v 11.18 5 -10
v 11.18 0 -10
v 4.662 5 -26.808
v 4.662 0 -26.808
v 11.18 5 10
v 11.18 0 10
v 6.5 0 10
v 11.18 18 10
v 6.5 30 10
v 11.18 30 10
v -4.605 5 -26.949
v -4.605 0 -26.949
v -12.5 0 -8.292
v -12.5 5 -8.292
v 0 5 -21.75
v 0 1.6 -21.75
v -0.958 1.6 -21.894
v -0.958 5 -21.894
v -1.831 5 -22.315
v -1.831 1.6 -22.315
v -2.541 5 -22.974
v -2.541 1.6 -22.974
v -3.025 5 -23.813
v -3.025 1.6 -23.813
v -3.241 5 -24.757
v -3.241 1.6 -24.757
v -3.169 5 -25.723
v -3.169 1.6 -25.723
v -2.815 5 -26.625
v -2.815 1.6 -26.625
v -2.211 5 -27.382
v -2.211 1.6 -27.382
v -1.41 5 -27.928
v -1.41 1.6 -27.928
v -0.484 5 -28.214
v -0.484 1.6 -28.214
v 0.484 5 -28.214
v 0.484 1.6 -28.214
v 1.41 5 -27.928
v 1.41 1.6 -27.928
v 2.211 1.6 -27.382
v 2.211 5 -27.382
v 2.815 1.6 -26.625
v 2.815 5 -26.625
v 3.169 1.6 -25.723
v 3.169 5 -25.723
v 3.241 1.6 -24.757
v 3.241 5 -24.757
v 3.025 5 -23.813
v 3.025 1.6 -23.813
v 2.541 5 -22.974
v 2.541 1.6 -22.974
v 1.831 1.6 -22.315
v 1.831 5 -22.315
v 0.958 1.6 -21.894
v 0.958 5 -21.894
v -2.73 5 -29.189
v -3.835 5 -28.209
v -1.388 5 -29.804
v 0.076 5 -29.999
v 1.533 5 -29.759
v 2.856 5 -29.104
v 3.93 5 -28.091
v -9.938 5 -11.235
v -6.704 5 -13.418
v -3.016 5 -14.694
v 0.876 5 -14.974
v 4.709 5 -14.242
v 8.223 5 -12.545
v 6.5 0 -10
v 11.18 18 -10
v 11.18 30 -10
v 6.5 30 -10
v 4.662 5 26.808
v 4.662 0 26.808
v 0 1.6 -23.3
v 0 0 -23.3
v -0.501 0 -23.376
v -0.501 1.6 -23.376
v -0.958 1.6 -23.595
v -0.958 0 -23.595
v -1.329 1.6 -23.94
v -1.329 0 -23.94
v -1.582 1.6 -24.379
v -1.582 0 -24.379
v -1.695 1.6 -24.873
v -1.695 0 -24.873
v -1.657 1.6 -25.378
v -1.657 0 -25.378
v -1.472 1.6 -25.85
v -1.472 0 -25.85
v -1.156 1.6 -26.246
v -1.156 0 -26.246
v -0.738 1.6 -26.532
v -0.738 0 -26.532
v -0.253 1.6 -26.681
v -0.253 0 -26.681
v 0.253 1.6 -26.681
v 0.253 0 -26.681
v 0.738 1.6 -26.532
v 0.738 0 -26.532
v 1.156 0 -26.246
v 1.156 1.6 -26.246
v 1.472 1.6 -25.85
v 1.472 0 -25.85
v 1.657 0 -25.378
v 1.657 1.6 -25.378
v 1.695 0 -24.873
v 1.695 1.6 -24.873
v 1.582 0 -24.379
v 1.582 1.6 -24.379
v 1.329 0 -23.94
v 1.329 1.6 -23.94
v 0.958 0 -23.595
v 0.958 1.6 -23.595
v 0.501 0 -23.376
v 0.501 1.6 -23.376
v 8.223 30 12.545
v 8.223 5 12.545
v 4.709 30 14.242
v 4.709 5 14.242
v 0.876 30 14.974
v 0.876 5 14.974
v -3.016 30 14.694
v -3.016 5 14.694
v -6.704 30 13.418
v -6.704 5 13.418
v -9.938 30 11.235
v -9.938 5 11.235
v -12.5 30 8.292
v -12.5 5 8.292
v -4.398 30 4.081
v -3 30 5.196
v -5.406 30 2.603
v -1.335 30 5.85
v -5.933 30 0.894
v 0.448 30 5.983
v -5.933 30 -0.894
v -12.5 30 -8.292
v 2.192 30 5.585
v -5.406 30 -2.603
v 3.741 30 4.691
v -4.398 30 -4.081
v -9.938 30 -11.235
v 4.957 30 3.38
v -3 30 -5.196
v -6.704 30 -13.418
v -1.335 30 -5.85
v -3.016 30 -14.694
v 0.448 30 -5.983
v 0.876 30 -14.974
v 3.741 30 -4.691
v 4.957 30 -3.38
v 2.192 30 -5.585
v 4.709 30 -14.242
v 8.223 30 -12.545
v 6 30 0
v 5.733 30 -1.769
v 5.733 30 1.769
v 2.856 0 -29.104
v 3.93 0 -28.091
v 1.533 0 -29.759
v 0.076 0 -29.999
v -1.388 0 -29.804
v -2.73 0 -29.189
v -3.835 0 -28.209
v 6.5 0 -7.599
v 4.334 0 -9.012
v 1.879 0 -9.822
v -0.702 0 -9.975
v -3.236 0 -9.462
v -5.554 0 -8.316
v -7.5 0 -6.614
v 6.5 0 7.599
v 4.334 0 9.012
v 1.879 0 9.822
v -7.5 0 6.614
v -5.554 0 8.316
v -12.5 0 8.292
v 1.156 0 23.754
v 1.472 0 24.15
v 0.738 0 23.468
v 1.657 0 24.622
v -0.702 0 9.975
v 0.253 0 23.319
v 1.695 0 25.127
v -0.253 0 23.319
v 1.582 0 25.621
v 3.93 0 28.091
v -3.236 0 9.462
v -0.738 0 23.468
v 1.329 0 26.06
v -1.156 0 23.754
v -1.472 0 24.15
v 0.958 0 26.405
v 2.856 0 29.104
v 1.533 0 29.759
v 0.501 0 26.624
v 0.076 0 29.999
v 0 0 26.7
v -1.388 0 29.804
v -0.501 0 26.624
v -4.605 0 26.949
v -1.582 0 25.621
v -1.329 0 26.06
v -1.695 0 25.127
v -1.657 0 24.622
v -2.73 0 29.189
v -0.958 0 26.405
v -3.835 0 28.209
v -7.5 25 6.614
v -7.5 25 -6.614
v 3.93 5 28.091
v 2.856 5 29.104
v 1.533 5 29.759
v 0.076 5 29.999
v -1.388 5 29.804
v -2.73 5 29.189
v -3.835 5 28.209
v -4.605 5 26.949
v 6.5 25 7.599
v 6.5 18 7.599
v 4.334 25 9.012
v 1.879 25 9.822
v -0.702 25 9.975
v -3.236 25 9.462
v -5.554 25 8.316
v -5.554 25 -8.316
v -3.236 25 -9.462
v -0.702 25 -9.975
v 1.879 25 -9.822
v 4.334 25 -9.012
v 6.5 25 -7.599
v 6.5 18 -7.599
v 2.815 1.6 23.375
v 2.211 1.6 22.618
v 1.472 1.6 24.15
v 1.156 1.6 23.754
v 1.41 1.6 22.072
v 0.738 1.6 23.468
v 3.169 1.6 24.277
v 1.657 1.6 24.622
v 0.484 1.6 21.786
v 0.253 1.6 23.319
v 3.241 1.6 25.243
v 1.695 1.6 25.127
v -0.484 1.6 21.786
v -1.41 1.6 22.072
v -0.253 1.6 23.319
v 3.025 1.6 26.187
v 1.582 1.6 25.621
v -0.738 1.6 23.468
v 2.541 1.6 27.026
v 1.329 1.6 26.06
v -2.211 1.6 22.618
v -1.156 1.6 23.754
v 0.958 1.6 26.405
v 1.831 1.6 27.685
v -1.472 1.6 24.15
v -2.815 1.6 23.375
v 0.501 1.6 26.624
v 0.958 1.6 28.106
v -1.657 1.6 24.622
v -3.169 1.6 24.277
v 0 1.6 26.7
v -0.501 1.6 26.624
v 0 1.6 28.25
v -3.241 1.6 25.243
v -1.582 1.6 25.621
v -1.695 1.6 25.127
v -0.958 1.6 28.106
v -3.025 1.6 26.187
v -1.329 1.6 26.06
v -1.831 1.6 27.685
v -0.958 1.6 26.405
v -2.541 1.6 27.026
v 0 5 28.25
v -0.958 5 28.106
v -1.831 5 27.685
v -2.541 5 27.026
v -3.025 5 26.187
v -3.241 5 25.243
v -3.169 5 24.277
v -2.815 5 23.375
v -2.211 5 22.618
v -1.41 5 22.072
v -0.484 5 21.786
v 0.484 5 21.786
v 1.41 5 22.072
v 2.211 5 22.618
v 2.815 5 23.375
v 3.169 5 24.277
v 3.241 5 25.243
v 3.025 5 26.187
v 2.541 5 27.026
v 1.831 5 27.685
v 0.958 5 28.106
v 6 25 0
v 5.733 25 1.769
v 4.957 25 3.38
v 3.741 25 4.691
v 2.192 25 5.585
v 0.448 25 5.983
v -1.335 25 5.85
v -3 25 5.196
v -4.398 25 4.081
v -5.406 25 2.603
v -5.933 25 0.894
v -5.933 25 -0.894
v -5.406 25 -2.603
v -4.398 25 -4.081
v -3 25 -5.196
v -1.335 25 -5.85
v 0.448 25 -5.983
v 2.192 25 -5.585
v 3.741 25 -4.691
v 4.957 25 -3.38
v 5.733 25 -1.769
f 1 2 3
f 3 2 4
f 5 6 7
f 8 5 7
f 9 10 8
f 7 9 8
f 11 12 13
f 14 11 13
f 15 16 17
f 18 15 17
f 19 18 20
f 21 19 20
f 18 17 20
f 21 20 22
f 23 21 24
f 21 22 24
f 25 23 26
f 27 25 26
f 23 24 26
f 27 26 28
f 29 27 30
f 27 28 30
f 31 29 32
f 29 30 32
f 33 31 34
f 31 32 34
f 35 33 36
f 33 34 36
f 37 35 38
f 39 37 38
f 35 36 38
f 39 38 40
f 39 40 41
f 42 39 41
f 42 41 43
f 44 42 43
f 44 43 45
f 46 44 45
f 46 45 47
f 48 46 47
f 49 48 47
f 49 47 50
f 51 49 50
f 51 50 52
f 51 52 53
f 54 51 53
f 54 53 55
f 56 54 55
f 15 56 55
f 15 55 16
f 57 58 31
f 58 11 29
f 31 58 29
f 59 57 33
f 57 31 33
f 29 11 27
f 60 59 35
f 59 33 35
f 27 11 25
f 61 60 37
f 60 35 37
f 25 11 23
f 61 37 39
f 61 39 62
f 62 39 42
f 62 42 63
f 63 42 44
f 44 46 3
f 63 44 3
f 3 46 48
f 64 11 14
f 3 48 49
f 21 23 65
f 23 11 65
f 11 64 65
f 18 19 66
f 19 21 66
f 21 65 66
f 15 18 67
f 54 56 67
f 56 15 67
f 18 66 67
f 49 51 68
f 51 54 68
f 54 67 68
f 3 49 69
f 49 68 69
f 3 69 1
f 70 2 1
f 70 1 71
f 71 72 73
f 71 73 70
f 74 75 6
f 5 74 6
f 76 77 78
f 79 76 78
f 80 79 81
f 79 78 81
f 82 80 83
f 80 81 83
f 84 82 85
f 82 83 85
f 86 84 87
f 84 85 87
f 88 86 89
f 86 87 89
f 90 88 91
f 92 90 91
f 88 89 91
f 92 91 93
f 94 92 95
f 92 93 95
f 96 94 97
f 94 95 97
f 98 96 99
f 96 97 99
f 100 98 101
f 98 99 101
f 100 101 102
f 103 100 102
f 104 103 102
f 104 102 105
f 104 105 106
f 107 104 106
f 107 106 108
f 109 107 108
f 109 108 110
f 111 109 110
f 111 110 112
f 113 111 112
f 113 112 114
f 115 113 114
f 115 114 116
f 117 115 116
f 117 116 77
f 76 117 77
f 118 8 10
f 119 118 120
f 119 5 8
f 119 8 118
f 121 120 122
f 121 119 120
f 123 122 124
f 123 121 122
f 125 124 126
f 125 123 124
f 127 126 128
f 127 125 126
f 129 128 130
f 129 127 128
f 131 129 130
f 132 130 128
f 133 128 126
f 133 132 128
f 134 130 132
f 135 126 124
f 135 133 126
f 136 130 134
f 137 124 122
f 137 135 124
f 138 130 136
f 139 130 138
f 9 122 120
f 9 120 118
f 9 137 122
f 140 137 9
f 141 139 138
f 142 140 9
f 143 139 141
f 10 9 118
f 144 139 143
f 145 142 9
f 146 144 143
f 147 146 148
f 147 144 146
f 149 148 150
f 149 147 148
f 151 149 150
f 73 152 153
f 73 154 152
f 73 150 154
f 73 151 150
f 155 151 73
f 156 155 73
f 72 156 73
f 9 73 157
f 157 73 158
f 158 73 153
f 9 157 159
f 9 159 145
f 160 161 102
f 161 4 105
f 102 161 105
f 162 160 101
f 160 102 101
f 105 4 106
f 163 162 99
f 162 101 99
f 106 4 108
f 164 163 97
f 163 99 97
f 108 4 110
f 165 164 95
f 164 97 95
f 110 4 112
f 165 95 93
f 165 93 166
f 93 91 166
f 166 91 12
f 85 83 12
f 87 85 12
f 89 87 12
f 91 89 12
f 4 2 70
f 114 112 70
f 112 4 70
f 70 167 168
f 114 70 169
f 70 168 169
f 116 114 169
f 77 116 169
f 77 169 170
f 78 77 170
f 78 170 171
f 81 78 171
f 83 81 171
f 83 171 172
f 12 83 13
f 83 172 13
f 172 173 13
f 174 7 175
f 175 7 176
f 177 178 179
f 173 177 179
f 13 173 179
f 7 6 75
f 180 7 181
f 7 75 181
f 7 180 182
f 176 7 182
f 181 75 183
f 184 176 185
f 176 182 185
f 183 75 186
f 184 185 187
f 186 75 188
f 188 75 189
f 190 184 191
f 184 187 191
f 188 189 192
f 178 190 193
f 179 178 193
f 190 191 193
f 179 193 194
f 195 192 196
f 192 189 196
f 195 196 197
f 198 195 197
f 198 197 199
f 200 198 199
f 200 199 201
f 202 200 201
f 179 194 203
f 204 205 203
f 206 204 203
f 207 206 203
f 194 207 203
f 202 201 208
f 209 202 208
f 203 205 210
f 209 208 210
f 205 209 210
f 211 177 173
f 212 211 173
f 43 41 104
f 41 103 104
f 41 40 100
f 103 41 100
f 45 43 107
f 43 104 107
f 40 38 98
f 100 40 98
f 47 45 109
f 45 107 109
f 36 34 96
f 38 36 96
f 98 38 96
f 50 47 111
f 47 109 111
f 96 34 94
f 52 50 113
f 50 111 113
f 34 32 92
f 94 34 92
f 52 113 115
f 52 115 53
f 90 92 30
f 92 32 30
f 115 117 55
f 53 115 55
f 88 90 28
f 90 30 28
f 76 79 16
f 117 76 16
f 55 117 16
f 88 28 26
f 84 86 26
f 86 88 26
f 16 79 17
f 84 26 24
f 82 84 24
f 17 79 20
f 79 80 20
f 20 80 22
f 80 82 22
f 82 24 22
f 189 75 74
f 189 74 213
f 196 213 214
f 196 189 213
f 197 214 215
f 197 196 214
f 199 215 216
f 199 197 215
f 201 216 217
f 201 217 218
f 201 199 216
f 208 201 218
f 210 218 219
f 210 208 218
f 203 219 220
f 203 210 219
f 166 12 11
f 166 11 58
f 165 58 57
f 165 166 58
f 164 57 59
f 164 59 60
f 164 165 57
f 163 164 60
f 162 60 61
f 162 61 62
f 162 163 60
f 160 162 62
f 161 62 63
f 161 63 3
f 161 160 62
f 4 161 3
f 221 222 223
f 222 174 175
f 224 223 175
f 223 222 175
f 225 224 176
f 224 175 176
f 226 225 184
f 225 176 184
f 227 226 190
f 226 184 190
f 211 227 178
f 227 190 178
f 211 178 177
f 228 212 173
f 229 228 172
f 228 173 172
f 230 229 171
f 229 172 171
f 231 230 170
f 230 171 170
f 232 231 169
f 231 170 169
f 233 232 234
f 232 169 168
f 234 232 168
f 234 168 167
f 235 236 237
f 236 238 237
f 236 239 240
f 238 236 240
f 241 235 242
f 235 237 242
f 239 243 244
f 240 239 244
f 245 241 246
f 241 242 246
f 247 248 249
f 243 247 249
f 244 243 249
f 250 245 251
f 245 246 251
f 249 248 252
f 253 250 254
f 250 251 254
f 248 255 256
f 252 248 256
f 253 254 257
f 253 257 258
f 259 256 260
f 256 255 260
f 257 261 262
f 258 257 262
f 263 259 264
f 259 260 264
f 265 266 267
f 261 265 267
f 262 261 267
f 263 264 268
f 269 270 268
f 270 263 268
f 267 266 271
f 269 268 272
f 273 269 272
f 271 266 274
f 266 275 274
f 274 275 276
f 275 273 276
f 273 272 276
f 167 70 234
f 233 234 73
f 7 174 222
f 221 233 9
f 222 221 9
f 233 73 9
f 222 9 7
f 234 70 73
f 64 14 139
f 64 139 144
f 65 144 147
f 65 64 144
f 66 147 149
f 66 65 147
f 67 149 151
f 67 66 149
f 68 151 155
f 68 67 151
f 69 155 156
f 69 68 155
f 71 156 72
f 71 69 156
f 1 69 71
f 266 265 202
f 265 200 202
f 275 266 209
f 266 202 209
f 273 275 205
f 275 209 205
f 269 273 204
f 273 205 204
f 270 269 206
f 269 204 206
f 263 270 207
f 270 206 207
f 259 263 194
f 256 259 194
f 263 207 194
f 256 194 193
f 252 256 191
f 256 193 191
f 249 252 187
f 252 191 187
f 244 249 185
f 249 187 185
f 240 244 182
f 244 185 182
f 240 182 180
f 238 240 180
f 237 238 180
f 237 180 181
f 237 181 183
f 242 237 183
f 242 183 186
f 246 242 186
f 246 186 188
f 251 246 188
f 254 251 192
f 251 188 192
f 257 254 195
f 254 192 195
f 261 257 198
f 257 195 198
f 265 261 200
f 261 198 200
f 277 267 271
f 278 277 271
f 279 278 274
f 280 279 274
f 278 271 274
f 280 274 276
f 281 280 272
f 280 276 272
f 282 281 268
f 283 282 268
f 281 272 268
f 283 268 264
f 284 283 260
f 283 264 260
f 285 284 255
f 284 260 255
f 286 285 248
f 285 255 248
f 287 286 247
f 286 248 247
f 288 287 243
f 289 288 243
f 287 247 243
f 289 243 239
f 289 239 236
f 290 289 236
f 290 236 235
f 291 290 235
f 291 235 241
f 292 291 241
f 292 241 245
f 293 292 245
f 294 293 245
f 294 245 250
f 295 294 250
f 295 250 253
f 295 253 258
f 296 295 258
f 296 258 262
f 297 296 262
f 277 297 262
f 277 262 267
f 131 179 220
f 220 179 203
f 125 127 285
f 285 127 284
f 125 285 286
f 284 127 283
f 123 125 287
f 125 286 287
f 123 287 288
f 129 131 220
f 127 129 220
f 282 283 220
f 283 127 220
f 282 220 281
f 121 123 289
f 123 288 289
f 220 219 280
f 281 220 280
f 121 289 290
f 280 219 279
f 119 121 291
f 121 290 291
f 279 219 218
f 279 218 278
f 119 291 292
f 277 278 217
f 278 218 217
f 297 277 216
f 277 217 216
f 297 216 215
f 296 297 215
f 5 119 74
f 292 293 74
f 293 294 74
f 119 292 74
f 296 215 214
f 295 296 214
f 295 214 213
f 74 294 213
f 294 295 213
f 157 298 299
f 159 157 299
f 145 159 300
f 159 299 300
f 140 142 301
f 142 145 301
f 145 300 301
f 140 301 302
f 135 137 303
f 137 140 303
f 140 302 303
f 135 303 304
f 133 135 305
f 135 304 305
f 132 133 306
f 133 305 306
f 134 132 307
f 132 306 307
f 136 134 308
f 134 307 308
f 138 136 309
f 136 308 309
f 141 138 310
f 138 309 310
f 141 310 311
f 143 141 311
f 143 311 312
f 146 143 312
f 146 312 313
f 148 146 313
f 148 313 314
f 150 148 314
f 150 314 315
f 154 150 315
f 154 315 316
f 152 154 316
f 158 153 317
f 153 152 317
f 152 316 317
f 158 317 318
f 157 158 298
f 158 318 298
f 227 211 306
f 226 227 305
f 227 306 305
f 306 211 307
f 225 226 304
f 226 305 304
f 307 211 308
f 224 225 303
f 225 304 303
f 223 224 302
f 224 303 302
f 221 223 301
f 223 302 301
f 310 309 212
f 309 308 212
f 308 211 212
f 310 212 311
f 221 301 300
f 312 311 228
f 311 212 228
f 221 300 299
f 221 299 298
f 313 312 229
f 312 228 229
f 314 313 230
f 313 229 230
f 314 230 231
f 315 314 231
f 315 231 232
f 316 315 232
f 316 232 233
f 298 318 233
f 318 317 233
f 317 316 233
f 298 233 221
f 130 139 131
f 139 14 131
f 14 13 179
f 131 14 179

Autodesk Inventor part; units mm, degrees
ref_plane "YZ Plane" through (0, 0, 0) normal (1, 0, 0) x (0, 1, 0)
ref_plane "XZ Plane" through (0, 0, 0) normal (0, 1, 0) x (-1, 0, 0)
ref_plane "XY Plane" through (0, 0, 0) normal (0, 0, 1) x (1, 0, 0)
sketch "Sketch1" plane through (0, 0, 0) normal (0, 1, 0) x (-1, 0, 0)
  line L0 (-7.5, 6.6144) -> (7.5, 6.6144) construction
  line L1 (7.5, 6.6144) -> (7.5, -6.6144)
  line L2 (7.5, -6.6144) -> (-7.5, -6.6144) construction
  line L3 (-7.5, -6.6144) -> (-7.5, 6.6144)
  line L4 (-7.5, 6.6144) -> (7.5, -6.6144) construction
  line L5 (7.5, 6.6144) -> (-7.5, -6.6144) construction
  arc A0 (7.5, 6.6144) -> (-7.5, 6.6144) centre (0, 0) ccw
  arc A1 (-7.5, -6.6144) -> (7.5, -6.6144) centre (0, 0) ccw
  line L6 (-12.5, 8.2916) -> (-12.5, -8.2916)
  arc A2 (-12.5, -8.2916) -> (12.5, -8.2916) centre (0, 0) ccw
  line L7 (12.5, -8.2916) -> (12.5, 8.2916)
  arc A3 (12.5, 8.2916) -> (-12.5, 8.2916) centre (0, 0) ccw
  dimension "d1" = 15
  dimension "d2" = 10
  dimension "d3" = 5
extrude "Extrusion1" add sketch "Sketch1" along normal blind 25
sketch "Sketch2" plane through (0, 25, 0) normal (0, 1, 0) x (1, 0, 0)
  arc A0 (12.5, 8.2916) -> (-12.5, 8.2916) centre (0, 0) ccw projected
  line L0 (-12.5, 8.2916) -> (-12.5, -8.2916) projected
  arc A1 (-12.5, -8.2916) -> (12.5, -8.2916) centre (0, 0) ccw projected
  line L1 (12.5, -8.2916) -> (12.5, 8.2916) projected
  line L2 (7.5, 6.6144) -> (7.5, -6.6144) projected
  arc A2 (-7.5, -6.6144) -> (7.5, -6.6144) centre (0, 0) ccw projected
  line L3 (-7.5, -6.6144) -> (-7.5, 6.6144) projected
  arc A3 (7.5, 6.6144) -> (-7.5, 6.6144) centre (0, 0) ccw projected
  circle A4 centre (0, 0) radius 6
  dimension "d6" = 12
extrude "Extrusion2" add sketch "Sketch2" along normal blind 5 contours L1 A1 L0 A0 | L2 A2 L3 A3
sketch "Sketch3" plane through (12.5, 0, 8.2916) normal (1, 0, 0) x (0, 0, -1)
  line L0 (18.2916, 18) -> (-1.7084, 18)
  line L1 (-1.7084, 18) -> (-1.7084, 30)
  line L2 (-1.7084, 30) -> (18.2916, 30)
  line L3 (18.2916, 30) -> (18.2916, 18)
  line L4 (0, 30) -> (16.5831, 30) projected
  point P0 (8.2916, 0)
  point P1 (8.2916, 30)
  dimension "d9" = 12
  dimension "d10" = 20
extrude "Extrusion3" cut sketch "Sketch3" against normal blind 6
sketch "Sketch4" plane through (12.5, 18, 8.2916) normal (0, 1, 0) x (1, 0, 0)
  arc A0 (-1.3197, -1.7084) -> (0, 0) centre (-12.5, 8.2916) ccw projected
  line L0 (0, 16.5831) -> (0, 0) projected
  arc A1 (0, 16.5831) -> (-1.3197, 18.2916) centre (-12.5, 8.2916) ccw projected
  line L1 (-1.3197, 18.2916) -> (-6, 18.2916) projected
  line L2 (-6, 18.2916) -> (-6, 15.8909) projected
  arc A2 (-5, 14.9059) -> (-6, 15.8909) centre (-12.5, 8.2916) ccw projected
  line L3 (-5, 1.6772) -> (-5, 14.9059) projected
  arc A3 (-6, 0.6922) -> (-5, 1.6772) centre (-12.5, 8.2916) ccw projected
  line L4 (-6, 0.6922) -> (-6, -1.7084) projected
  line L5 (-1.3197, -1.7084) -> (-6, -1.7084) projected
  point P0 (-12.5, 8.2916)
extrude "Extrusion4" cut sketch "Sketch4" against normal through all
sketch "Sketch5" plane through (0, 0, 0) normal (0, -1, 0) x (1, 0, 0)
  line L0 (6.5, -10) -> (6.5, -7.5993) projected
  arc A0 (-7.5, -6.6144) -> (6.5, -7.5993) centre (0, 0) ccw projected
  line L1 (-7.5, 6.6144) -> (-7.5, -6.6144) projected
  arc A1 (6.5, 7.5993) -> (-7.5, 6.6144) centre (0, 0) ccw projected
  line L2 (6.5, 7.5993) -> (6.5, 10) projected
  line L3 (6.5, 10) -> (11.1803, 10) projected
  arc A2 (11.1803, 10) -> (-12.5, 8.2916) centre (0, 0) ccw projected
  line L4 (-12.5, -8.2916) -> (-12.5, 8.2916) projected
  arc A3 (-12.5, -8.2916) -> (11.1803, -10) centre (0, 0) ccw projected
  line L5 (11.1803, -10) -> (6.5, -10) projected
  line L6 (0, 25) -> (0, -25)
  circle A4 centre (0, 25) radius 5
  circle A5 centre (0, -25) radius 5
  line L7 (4.6617, 26.8079) -> (11.1803, 10)
  line L8 (11.1803, -10) -> (4.6617, -26.8079)
  line L9 (-4.6047, -26.9486) -> (-12.5, -8.2916)
  line L10 (-12.5, 8.2916) -> (-4.6047, 26.9486)
  dimension "d15" = 50
  dimension "d16" = 10
  dimension "d17" = 10
extrude "Extrusion5" add sketch "Sketch5" against normal blind 5 contours L8 A5 L6 A3 | L6 A5 L9 A3 | A5 | L6 A4 L7 A2 | A2 L10 A4 L6 | A4
sketch "Sketch6" plane through (0, 5, 0) normal (0, 1, 0) x (1, 0, 0)
  line L0 (-12.5, -8.2916) -> (-4.6047, -26.9486) projected
  arc A0 (-4.6047, -26.9486) -> (4.6617, -26.8079) centre (0, -25) ccw projected
  line L1 (4.6617, -26.8079) -> (11.1803, -10) projected
  arc A1 (-12.5, -8.2916) -> (11.1803, -10) centre (0, 0) ccw projected
  arc A2 (11.1803, 10) -> (-12.5, 8.2916) centre (0, 0) ccw projected
  line L2 (11.1803, 10) -> (4.6617, 26.8079) projected
  arc A3 (4.6617, 26.8079) -> (-4.6047, 26.9486) centre (0, 25) ccw projected
  line L3 (-4.6047, 26.9486) -> (-12.5, 8.2916) projected
hole "Hole1" at (0, 5, 25) at (0, 5, -25) direction (0, -1, 0) diameter 3.4 end through all counterbore diameter 6.5 counterbore depth 3.4 clearance for "Socket Head Cap Screw ISO 4762" size "M3" standard "ISO"
properties part number "motor mount"
